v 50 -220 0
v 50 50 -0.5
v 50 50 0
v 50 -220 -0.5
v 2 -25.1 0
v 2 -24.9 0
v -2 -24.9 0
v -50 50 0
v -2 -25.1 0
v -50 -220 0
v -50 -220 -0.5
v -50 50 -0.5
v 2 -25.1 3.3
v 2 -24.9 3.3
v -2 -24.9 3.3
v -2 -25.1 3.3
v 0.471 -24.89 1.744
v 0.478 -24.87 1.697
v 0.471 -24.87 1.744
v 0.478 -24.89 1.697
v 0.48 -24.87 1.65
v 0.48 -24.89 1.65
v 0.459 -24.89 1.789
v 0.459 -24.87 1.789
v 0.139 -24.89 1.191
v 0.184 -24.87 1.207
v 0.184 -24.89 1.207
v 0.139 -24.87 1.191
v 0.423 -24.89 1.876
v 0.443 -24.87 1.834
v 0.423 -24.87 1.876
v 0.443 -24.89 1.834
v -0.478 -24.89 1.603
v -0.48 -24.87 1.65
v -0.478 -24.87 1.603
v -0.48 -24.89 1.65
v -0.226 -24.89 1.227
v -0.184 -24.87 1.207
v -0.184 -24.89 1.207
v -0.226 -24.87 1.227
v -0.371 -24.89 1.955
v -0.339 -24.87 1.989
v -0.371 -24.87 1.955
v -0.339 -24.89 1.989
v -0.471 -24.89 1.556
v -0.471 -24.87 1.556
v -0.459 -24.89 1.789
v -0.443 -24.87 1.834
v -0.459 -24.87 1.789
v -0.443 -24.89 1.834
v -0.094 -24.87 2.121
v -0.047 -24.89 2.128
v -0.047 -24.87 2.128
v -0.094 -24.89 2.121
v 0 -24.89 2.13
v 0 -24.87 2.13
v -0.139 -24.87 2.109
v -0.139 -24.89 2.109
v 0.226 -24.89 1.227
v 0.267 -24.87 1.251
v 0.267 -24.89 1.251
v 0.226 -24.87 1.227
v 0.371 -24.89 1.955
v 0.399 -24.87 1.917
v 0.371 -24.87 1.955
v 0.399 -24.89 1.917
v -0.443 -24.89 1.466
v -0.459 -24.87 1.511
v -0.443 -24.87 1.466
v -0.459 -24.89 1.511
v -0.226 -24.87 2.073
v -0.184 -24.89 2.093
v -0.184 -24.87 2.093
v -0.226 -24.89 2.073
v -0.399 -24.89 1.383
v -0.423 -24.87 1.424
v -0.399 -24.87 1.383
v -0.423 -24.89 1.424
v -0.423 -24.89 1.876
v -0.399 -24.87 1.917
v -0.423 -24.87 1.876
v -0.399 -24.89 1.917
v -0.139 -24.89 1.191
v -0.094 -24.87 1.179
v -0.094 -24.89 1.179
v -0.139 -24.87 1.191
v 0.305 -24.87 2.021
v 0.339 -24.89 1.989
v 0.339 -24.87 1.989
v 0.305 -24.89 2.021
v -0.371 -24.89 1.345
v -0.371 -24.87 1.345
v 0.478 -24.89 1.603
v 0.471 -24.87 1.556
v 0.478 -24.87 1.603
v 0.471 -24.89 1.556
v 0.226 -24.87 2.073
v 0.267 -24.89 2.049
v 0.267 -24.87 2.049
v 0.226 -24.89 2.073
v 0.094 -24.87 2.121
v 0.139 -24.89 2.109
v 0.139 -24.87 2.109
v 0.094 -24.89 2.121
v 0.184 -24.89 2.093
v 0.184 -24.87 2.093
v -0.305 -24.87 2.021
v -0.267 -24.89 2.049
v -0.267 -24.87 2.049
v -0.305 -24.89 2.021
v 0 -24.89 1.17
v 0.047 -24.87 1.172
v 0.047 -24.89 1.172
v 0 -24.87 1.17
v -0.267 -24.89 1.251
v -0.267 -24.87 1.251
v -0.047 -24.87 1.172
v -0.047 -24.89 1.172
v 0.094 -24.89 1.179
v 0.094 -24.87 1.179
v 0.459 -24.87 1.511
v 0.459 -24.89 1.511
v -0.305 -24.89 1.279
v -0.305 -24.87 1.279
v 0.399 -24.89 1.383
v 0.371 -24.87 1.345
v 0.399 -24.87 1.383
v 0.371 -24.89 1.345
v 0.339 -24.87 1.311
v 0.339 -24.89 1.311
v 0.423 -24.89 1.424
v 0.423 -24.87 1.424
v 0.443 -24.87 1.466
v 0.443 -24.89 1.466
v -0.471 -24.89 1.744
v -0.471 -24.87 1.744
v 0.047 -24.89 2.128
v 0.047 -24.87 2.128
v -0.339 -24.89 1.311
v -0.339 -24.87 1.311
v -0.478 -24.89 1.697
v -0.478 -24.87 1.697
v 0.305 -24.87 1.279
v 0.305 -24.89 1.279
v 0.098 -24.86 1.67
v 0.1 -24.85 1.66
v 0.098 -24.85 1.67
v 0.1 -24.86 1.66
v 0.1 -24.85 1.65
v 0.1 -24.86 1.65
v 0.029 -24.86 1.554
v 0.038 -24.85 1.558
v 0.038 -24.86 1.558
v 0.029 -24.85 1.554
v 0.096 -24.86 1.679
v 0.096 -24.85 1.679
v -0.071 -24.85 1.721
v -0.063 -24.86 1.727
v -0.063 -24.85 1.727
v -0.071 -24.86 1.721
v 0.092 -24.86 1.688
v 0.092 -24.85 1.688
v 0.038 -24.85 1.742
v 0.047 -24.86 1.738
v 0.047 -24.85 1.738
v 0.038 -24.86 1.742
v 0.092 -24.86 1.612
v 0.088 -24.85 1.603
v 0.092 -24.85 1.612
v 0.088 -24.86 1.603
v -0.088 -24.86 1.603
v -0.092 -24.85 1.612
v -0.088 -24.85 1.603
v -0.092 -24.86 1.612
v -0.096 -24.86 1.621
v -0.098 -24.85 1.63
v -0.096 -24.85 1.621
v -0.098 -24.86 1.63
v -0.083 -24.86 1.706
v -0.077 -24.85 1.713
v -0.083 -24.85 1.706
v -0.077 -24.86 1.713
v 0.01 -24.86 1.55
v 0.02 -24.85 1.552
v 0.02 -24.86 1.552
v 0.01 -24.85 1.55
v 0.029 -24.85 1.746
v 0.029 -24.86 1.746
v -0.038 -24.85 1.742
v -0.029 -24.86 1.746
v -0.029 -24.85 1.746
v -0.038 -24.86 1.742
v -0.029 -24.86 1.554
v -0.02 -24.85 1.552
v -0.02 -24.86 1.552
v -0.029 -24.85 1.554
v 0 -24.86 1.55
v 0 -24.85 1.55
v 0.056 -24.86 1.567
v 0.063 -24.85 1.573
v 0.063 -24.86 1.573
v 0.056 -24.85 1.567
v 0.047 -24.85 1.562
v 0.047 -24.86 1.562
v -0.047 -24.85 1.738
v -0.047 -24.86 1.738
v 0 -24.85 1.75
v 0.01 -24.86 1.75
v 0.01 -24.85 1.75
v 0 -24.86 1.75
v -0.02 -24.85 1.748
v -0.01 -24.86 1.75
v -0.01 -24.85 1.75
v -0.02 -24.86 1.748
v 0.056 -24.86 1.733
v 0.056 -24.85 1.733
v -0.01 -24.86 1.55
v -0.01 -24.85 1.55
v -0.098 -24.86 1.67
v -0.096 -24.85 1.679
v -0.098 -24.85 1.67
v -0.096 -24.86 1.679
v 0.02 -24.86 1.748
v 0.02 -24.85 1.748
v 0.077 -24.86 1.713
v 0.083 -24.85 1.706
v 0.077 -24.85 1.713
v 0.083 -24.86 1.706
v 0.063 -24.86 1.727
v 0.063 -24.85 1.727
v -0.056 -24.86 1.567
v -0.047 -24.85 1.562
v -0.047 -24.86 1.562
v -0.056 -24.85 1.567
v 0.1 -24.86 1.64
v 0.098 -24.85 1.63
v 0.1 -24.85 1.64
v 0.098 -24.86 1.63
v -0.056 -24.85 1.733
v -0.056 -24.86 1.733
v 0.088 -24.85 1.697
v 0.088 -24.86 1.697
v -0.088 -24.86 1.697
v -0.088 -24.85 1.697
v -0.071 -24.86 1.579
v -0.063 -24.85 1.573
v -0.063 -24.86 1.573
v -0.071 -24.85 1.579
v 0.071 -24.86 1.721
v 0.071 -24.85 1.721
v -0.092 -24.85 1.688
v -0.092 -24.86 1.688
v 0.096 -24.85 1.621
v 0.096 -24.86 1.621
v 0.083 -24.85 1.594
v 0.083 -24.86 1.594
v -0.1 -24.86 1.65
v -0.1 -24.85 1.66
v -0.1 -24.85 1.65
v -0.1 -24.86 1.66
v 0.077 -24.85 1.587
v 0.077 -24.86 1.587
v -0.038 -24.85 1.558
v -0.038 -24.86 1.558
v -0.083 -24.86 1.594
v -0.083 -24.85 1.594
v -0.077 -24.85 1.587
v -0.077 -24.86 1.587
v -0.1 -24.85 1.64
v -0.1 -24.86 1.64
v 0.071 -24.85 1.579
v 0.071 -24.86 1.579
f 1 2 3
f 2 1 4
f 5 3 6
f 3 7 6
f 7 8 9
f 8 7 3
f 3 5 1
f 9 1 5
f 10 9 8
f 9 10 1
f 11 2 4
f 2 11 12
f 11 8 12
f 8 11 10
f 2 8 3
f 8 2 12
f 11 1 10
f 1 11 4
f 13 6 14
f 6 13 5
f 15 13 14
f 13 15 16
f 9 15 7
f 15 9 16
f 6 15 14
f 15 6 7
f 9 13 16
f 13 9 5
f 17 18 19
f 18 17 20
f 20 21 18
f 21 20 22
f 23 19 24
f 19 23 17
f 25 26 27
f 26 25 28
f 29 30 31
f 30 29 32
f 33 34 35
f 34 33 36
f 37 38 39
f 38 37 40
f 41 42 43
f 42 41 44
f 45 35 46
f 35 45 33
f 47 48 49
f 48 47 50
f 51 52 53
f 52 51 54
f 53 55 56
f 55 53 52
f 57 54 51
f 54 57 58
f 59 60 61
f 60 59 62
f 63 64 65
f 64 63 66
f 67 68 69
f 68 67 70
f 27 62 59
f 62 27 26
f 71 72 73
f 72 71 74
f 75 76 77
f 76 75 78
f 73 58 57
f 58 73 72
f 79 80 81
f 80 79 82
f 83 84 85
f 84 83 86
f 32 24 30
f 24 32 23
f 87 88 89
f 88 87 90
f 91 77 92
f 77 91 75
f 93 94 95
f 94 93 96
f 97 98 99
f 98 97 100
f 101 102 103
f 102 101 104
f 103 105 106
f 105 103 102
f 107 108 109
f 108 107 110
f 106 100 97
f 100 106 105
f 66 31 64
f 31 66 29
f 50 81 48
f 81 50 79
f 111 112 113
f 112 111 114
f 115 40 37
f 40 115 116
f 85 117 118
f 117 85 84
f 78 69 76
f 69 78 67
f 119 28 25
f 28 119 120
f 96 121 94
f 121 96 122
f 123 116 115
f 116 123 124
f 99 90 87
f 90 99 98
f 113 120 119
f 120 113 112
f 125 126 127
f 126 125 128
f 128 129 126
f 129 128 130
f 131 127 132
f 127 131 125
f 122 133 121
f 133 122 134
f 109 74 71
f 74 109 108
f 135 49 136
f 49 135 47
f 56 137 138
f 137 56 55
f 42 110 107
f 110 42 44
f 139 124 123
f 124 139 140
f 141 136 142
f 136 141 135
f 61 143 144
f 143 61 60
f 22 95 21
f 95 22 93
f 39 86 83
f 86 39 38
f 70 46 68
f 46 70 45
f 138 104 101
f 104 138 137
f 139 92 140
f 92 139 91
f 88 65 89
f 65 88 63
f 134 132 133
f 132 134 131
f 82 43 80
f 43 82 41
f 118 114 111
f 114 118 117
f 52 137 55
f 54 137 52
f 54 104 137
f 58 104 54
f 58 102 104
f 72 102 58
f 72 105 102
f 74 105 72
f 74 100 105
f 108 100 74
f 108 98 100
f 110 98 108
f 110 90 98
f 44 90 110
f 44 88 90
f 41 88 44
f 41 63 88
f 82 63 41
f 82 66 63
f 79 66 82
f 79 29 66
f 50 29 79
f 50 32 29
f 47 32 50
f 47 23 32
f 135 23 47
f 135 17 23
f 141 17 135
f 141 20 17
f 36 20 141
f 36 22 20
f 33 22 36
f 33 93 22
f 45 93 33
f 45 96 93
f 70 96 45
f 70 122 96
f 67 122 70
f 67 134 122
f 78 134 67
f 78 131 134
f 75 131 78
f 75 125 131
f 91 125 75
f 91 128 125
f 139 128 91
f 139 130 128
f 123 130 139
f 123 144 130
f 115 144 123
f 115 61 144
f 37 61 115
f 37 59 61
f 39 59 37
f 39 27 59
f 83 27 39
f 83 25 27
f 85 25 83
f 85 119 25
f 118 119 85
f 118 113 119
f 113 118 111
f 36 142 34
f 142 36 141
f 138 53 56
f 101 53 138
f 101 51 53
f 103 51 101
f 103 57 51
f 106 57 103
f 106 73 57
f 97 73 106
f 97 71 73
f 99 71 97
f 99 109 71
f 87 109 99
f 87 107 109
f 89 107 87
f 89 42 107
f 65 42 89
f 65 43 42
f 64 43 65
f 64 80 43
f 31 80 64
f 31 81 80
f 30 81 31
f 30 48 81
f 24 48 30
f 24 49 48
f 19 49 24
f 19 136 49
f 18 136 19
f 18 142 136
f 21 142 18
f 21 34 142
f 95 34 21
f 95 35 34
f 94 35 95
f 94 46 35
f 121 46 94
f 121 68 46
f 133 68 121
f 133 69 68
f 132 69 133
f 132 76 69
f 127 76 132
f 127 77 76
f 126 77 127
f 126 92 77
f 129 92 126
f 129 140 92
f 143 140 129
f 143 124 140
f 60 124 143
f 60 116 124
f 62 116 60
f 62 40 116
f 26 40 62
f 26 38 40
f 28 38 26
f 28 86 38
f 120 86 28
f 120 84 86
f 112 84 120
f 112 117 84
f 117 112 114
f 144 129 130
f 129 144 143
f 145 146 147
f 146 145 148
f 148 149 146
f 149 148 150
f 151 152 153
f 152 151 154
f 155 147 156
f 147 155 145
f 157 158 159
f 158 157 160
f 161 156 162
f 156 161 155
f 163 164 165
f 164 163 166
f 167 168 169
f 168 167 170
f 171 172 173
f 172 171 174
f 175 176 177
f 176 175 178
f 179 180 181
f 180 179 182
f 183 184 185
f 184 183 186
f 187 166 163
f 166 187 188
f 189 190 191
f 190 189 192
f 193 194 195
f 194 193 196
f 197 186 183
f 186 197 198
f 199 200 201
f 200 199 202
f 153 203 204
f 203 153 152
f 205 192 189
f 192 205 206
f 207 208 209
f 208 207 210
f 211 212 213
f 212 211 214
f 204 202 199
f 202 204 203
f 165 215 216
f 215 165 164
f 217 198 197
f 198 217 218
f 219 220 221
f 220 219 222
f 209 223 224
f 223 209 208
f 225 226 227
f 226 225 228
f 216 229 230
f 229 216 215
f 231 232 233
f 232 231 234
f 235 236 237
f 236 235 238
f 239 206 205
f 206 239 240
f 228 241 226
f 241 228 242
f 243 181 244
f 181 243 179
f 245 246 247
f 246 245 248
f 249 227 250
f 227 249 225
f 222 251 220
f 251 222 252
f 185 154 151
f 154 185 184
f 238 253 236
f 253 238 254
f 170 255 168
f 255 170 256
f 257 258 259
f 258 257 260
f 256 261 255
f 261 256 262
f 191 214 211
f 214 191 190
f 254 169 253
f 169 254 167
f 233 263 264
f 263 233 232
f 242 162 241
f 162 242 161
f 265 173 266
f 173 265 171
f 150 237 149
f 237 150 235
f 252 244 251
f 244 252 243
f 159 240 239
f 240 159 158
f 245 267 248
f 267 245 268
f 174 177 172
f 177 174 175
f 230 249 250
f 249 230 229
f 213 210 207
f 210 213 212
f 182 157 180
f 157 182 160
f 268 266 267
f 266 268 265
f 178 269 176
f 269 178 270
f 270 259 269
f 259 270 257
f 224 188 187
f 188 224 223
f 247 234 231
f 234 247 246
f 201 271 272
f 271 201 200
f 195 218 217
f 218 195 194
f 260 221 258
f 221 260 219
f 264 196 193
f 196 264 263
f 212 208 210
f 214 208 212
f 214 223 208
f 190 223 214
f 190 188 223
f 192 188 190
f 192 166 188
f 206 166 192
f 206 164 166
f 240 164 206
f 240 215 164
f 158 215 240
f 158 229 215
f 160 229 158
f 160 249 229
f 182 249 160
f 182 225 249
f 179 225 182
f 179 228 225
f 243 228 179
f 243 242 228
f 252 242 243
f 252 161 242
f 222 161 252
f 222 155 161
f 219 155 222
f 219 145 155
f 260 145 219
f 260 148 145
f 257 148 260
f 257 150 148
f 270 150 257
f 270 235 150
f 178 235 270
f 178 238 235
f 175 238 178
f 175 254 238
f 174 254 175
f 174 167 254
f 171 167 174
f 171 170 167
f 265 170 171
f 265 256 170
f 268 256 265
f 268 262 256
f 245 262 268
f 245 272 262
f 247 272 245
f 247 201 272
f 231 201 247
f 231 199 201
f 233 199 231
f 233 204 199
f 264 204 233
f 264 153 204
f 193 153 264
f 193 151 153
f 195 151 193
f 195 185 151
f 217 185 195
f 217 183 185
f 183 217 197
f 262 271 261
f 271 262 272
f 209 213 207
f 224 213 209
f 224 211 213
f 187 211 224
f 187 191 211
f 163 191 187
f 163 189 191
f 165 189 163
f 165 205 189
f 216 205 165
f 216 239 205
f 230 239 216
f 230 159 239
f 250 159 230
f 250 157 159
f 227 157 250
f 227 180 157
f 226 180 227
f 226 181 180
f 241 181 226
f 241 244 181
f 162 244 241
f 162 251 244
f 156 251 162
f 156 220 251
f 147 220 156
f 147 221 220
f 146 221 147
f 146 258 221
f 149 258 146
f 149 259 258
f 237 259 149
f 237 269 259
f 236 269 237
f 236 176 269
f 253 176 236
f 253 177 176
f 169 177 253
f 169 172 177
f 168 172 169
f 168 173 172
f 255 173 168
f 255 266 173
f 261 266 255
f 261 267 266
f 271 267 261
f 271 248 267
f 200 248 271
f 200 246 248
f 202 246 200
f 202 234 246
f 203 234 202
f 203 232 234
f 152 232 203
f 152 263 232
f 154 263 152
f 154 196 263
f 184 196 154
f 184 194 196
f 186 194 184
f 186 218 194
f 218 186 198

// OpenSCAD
// Quiet range for comparing the sight line with an actual target at eye height.
$fn = 64;
color([0.24, 0.30, 0.22])
    translate([-50, -220, -0.5]) cube([100, 270, 0.5]);
color([0.75, 0.74, 0.68])
    translate([-2, -25.1, 0]) cube([4, 0.2, 3.3]);
color([0.08, 0.09, 0.10])
    translate([0, -24.87, 1.65]) rotate([90, 0, 0]) cylinder(h = 0.02, r = 0.48);
color([0.8, 0.3, 0.08])
    translate([0, -24.85, 1.65]) rotate([90, 0, 0]) cylinder(h = 0.01, r = 0.10);
